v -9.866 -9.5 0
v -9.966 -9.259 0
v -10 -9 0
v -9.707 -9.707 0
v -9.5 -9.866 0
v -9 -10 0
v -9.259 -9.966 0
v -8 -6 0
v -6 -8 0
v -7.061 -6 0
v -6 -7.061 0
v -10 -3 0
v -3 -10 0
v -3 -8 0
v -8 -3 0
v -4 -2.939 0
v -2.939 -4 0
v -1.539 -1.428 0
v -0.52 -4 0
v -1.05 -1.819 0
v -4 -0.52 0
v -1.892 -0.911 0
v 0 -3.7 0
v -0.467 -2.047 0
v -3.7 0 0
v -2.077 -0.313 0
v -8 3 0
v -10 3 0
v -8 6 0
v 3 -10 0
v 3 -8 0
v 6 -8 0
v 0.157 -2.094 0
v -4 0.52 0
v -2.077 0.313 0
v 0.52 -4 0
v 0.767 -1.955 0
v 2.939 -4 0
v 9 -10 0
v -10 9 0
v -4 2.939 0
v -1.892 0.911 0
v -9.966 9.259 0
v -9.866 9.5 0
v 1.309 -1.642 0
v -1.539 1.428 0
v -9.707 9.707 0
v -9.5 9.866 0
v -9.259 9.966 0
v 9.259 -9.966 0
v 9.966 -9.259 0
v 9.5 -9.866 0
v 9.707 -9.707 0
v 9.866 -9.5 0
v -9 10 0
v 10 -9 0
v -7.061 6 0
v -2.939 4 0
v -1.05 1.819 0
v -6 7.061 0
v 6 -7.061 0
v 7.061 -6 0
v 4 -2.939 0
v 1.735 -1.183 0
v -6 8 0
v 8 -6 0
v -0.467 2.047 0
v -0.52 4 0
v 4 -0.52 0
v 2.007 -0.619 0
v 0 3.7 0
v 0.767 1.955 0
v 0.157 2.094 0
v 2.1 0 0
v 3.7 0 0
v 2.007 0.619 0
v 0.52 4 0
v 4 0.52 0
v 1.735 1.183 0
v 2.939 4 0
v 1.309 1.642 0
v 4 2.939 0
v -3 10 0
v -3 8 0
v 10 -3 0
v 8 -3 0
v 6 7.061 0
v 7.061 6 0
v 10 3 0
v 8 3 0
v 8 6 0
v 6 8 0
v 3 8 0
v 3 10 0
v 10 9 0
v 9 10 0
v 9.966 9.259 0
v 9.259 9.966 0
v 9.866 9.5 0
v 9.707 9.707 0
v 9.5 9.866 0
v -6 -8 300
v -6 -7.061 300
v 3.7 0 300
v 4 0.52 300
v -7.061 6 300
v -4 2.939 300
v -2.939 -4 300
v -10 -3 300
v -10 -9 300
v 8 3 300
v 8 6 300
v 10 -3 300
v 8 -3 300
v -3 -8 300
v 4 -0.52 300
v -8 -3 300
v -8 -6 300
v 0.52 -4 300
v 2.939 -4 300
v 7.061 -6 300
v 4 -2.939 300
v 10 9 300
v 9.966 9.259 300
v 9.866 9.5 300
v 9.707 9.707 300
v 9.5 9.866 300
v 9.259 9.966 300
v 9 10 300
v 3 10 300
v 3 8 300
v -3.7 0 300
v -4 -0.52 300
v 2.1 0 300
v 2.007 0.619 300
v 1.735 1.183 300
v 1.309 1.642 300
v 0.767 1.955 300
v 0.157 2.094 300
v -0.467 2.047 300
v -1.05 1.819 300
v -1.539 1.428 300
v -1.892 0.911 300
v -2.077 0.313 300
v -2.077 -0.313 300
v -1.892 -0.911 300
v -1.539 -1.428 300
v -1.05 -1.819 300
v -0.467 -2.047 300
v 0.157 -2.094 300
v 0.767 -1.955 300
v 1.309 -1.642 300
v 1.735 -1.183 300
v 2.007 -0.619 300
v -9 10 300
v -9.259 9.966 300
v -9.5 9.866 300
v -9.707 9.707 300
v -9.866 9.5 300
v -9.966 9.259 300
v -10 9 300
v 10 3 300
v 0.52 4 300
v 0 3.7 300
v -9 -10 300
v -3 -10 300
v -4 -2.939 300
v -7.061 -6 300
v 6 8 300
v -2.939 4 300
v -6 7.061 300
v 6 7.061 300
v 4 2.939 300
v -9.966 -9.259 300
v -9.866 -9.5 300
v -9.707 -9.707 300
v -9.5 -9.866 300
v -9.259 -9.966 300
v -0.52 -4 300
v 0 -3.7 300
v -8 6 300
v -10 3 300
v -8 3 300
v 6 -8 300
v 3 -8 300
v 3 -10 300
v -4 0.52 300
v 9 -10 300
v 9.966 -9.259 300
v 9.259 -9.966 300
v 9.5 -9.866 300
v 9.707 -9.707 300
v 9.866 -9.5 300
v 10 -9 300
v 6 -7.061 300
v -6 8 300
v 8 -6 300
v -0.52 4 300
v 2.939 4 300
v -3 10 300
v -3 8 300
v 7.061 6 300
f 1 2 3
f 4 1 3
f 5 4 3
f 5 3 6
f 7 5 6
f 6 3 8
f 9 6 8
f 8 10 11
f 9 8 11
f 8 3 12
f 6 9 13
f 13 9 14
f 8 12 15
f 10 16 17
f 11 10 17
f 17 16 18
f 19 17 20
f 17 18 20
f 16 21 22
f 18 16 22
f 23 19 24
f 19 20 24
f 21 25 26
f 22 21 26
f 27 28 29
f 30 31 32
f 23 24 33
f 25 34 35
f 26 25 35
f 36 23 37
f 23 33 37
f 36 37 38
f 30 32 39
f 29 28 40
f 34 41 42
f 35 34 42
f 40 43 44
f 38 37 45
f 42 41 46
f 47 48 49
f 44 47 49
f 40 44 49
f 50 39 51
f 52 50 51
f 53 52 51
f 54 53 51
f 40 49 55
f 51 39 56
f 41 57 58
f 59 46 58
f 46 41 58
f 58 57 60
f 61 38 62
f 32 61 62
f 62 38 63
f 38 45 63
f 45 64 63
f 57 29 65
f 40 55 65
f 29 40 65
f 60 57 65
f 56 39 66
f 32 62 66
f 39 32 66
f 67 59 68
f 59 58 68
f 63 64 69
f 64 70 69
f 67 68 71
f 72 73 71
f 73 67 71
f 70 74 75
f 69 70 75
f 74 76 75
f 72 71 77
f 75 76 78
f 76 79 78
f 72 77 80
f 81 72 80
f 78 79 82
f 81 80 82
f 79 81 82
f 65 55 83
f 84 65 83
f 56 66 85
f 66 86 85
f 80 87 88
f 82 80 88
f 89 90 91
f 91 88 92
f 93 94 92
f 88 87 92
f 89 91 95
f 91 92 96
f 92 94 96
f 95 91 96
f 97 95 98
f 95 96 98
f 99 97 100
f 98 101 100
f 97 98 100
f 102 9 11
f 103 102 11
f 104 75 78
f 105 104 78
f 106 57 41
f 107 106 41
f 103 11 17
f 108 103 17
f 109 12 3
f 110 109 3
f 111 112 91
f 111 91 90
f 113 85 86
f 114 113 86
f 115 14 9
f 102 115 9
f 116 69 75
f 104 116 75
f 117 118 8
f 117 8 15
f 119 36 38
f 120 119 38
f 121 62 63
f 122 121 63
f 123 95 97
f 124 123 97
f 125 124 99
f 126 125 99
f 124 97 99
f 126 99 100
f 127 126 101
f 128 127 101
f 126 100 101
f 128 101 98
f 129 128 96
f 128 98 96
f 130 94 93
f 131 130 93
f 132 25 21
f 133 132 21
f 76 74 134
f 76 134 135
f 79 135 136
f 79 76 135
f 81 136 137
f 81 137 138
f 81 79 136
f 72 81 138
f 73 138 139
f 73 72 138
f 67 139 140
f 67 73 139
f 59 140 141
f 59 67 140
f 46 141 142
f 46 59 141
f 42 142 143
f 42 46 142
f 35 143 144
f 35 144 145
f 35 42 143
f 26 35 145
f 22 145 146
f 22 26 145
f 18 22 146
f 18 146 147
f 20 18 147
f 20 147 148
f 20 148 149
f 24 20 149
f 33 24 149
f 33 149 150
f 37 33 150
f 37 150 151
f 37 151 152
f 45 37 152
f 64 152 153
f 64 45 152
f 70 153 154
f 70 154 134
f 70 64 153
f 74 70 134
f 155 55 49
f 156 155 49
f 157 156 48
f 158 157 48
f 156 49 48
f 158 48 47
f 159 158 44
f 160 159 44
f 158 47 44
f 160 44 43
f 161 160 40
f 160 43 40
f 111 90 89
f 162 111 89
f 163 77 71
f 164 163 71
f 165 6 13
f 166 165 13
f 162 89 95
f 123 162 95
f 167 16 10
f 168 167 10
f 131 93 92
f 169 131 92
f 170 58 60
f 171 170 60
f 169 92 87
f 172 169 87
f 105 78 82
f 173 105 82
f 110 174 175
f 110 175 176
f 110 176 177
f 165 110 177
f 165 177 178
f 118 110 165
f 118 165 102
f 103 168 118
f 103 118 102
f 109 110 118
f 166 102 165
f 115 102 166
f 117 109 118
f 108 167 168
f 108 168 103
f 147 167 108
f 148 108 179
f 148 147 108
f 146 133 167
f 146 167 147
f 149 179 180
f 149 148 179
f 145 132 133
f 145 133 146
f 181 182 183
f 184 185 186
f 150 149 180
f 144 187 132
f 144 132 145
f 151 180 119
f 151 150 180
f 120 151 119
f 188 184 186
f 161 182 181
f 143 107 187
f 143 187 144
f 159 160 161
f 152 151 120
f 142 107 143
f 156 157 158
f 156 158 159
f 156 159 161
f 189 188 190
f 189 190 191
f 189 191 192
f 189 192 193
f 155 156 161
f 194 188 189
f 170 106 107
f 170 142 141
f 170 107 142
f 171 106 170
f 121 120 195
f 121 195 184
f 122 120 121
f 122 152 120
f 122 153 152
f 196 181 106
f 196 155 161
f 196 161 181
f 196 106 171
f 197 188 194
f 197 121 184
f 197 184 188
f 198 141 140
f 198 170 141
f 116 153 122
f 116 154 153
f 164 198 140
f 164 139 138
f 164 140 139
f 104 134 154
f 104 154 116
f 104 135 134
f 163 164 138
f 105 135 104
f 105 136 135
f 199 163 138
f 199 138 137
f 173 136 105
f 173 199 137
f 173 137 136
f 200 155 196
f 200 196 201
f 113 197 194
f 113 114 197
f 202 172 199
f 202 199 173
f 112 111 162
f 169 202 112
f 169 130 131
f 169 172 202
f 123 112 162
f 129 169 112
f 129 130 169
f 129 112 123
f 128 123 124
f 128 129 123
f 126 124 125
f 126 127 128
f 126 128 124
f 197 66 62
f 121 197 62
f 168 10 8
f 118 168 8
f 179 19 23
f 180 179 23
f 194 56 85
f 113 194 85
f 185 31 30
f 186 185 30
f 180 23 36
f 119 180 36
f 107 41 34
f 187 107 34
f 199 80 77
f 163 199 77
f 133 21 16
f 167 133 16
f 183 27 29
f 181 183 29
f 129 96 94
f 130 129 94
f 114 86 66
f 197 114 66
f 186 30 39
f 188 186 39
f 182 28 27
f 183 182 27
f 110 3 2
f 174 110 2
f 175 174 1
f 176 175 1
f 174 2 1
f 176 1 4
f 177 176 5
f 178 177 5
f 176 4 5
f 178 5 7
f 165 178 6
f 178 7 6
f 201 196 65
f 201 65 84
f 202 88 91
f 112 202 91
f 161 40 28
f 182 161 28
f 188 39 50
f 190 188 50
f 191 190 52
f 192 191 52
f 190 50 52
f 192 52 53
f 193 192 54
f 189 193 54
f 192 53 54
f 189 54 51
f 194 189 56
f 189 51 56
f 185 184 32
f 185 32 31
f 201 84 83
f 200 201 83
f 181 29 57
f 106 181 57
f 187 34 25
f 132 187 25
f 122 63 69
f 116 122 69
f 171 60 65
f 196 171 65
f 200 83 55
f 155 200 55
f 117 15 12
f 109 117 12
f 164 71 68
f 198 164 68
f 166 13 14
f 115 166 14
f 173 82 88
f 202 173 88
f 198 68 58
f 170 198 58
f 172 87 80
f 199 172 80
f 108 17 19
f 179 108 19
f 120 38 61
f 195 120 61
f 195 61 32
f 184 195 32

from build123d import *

# Parameters (mm, degrees)
MODEL_R         = 2.1
EXTRUDE_1_DEPTH = 300


with BuildPart() as part:
    # Model → 보스-돌출1 (new body)
    with BuildSketch(Plane.XY):
        with BuildLine():
            Line((-10, 3), (-8, 3))
            Line((-8, 3), (-8, 6))
            Line((-8, 6), (-7.060660172, 6))
            Line((-7.060660172, 6), (-4, 2.939339828))
            Line((-4, 2.939339828), (-4, 0.519615242))
            Line((-4, 0.519615242), (-3.7, 0))
            Line((-3.7, 0), (-4, -0.519615242))
            Line((-4, -0.519615242), (-4, -2.939339828))
            Line((-4, -2.939339828), (-7.060660172, -6))
            Line((-7.060660172, -6), (-8, -6))
            Line((-8, -6), (-8, -3))
            Line((-8, -3), (-10, -3))
            Line((-10, -3), (-10, -9))
            ThreePointArc((-10, -9), (-9.707106781, -9.707106781), (-9, -10))
            Line((-9, -10), (-3, -10))
            Line((-3, -10), (-3, -8))
            Line((-3, -8), (-6, -8))
            Line((-6, -8), (-6, -7.060660172))
            Line((-6, -7.060660172), (-2.939339828, -4))
            Line((-2.939339828, -4), (-0.519615242, -4))
            Line((-0.519615242, -4), (0, -3.7))
            Line((0, -3.7), (0.519615242, -4))
            Line((0.519615242, -4), (2.939339828, -4))
            Line((2.939339828, -4), (6, -7.060660172))
            Line((6, -7.060660172), (6, -8))
            Line((6, -8), (3, -8))
            Line((3, -8), (3, -10))
            Line((3, -10), (9, -10))
            ThreePointArc((9, -10), (9.707106781, -9.707106781), (10, -9))
            Line((10, -9), (10, -3))
            Line((10, -3), (8, -3))
            Line((8, -3), (8, -6))
            Line((8, -6), (7.060660172, -6))
            Line((7.060660172, -6), (4, -2.939339828))
            Line((4, -2.939339828), (4, -0.519615242))
            Line((4, -0.519615242), (3.7, 0))
            Line((3.7, 0), (4, 0.519615242))
            Line((4, 0.519615242), (4, 2.939339828))
            Line((4, 2.939339828), (7.060660172, 6))
            Line((7.060660172, 6), (8, 6))
            Line((8, 6), (8, 3))
            Line((8, 3), (10, 3))
            Line((10, 3), (10, 9))
            ThreePointArc((10, 9), (9.707106781, 9.707106781), (9, 10))
            Line((9, 10), (3, 10))
            Line((3, 10), (3, 8))
            Line((3, 8), (6, 8))
            Line((6, 8), (6, 7.060660172))
            Line((6, 7.060660172), (2.939339828, 4))
            Line((2.939339828, 4), (0.519615242, 4))
            Line((0.519615242, 4), (0, 3.7))
            Line((0, 3.7), (-0.519615242, 4))
            Line((-0.519615242, 4), (-2.939339828, 4))
            Line((-2.939339828, 4), (-6, 7.060660172))
            Line((-6, 7.060660172), (-6, 8))
            Line((-6, 8), (-3, 8))
            Line((-3, 8), (-3, 10))
            Line((-3, 10), (-9, 10))
            ThreePointArc((-9, 10), (-9.707106781, 9.707106781), (-10, 9))
            Line((-10, 9), (-10, 3))
        make_face()
        Circle(MODEL_R, mode=Mode.SUBTRACT)
    extrude(amount=EXTRUDE_1_DEPTH)


solid = part.part
